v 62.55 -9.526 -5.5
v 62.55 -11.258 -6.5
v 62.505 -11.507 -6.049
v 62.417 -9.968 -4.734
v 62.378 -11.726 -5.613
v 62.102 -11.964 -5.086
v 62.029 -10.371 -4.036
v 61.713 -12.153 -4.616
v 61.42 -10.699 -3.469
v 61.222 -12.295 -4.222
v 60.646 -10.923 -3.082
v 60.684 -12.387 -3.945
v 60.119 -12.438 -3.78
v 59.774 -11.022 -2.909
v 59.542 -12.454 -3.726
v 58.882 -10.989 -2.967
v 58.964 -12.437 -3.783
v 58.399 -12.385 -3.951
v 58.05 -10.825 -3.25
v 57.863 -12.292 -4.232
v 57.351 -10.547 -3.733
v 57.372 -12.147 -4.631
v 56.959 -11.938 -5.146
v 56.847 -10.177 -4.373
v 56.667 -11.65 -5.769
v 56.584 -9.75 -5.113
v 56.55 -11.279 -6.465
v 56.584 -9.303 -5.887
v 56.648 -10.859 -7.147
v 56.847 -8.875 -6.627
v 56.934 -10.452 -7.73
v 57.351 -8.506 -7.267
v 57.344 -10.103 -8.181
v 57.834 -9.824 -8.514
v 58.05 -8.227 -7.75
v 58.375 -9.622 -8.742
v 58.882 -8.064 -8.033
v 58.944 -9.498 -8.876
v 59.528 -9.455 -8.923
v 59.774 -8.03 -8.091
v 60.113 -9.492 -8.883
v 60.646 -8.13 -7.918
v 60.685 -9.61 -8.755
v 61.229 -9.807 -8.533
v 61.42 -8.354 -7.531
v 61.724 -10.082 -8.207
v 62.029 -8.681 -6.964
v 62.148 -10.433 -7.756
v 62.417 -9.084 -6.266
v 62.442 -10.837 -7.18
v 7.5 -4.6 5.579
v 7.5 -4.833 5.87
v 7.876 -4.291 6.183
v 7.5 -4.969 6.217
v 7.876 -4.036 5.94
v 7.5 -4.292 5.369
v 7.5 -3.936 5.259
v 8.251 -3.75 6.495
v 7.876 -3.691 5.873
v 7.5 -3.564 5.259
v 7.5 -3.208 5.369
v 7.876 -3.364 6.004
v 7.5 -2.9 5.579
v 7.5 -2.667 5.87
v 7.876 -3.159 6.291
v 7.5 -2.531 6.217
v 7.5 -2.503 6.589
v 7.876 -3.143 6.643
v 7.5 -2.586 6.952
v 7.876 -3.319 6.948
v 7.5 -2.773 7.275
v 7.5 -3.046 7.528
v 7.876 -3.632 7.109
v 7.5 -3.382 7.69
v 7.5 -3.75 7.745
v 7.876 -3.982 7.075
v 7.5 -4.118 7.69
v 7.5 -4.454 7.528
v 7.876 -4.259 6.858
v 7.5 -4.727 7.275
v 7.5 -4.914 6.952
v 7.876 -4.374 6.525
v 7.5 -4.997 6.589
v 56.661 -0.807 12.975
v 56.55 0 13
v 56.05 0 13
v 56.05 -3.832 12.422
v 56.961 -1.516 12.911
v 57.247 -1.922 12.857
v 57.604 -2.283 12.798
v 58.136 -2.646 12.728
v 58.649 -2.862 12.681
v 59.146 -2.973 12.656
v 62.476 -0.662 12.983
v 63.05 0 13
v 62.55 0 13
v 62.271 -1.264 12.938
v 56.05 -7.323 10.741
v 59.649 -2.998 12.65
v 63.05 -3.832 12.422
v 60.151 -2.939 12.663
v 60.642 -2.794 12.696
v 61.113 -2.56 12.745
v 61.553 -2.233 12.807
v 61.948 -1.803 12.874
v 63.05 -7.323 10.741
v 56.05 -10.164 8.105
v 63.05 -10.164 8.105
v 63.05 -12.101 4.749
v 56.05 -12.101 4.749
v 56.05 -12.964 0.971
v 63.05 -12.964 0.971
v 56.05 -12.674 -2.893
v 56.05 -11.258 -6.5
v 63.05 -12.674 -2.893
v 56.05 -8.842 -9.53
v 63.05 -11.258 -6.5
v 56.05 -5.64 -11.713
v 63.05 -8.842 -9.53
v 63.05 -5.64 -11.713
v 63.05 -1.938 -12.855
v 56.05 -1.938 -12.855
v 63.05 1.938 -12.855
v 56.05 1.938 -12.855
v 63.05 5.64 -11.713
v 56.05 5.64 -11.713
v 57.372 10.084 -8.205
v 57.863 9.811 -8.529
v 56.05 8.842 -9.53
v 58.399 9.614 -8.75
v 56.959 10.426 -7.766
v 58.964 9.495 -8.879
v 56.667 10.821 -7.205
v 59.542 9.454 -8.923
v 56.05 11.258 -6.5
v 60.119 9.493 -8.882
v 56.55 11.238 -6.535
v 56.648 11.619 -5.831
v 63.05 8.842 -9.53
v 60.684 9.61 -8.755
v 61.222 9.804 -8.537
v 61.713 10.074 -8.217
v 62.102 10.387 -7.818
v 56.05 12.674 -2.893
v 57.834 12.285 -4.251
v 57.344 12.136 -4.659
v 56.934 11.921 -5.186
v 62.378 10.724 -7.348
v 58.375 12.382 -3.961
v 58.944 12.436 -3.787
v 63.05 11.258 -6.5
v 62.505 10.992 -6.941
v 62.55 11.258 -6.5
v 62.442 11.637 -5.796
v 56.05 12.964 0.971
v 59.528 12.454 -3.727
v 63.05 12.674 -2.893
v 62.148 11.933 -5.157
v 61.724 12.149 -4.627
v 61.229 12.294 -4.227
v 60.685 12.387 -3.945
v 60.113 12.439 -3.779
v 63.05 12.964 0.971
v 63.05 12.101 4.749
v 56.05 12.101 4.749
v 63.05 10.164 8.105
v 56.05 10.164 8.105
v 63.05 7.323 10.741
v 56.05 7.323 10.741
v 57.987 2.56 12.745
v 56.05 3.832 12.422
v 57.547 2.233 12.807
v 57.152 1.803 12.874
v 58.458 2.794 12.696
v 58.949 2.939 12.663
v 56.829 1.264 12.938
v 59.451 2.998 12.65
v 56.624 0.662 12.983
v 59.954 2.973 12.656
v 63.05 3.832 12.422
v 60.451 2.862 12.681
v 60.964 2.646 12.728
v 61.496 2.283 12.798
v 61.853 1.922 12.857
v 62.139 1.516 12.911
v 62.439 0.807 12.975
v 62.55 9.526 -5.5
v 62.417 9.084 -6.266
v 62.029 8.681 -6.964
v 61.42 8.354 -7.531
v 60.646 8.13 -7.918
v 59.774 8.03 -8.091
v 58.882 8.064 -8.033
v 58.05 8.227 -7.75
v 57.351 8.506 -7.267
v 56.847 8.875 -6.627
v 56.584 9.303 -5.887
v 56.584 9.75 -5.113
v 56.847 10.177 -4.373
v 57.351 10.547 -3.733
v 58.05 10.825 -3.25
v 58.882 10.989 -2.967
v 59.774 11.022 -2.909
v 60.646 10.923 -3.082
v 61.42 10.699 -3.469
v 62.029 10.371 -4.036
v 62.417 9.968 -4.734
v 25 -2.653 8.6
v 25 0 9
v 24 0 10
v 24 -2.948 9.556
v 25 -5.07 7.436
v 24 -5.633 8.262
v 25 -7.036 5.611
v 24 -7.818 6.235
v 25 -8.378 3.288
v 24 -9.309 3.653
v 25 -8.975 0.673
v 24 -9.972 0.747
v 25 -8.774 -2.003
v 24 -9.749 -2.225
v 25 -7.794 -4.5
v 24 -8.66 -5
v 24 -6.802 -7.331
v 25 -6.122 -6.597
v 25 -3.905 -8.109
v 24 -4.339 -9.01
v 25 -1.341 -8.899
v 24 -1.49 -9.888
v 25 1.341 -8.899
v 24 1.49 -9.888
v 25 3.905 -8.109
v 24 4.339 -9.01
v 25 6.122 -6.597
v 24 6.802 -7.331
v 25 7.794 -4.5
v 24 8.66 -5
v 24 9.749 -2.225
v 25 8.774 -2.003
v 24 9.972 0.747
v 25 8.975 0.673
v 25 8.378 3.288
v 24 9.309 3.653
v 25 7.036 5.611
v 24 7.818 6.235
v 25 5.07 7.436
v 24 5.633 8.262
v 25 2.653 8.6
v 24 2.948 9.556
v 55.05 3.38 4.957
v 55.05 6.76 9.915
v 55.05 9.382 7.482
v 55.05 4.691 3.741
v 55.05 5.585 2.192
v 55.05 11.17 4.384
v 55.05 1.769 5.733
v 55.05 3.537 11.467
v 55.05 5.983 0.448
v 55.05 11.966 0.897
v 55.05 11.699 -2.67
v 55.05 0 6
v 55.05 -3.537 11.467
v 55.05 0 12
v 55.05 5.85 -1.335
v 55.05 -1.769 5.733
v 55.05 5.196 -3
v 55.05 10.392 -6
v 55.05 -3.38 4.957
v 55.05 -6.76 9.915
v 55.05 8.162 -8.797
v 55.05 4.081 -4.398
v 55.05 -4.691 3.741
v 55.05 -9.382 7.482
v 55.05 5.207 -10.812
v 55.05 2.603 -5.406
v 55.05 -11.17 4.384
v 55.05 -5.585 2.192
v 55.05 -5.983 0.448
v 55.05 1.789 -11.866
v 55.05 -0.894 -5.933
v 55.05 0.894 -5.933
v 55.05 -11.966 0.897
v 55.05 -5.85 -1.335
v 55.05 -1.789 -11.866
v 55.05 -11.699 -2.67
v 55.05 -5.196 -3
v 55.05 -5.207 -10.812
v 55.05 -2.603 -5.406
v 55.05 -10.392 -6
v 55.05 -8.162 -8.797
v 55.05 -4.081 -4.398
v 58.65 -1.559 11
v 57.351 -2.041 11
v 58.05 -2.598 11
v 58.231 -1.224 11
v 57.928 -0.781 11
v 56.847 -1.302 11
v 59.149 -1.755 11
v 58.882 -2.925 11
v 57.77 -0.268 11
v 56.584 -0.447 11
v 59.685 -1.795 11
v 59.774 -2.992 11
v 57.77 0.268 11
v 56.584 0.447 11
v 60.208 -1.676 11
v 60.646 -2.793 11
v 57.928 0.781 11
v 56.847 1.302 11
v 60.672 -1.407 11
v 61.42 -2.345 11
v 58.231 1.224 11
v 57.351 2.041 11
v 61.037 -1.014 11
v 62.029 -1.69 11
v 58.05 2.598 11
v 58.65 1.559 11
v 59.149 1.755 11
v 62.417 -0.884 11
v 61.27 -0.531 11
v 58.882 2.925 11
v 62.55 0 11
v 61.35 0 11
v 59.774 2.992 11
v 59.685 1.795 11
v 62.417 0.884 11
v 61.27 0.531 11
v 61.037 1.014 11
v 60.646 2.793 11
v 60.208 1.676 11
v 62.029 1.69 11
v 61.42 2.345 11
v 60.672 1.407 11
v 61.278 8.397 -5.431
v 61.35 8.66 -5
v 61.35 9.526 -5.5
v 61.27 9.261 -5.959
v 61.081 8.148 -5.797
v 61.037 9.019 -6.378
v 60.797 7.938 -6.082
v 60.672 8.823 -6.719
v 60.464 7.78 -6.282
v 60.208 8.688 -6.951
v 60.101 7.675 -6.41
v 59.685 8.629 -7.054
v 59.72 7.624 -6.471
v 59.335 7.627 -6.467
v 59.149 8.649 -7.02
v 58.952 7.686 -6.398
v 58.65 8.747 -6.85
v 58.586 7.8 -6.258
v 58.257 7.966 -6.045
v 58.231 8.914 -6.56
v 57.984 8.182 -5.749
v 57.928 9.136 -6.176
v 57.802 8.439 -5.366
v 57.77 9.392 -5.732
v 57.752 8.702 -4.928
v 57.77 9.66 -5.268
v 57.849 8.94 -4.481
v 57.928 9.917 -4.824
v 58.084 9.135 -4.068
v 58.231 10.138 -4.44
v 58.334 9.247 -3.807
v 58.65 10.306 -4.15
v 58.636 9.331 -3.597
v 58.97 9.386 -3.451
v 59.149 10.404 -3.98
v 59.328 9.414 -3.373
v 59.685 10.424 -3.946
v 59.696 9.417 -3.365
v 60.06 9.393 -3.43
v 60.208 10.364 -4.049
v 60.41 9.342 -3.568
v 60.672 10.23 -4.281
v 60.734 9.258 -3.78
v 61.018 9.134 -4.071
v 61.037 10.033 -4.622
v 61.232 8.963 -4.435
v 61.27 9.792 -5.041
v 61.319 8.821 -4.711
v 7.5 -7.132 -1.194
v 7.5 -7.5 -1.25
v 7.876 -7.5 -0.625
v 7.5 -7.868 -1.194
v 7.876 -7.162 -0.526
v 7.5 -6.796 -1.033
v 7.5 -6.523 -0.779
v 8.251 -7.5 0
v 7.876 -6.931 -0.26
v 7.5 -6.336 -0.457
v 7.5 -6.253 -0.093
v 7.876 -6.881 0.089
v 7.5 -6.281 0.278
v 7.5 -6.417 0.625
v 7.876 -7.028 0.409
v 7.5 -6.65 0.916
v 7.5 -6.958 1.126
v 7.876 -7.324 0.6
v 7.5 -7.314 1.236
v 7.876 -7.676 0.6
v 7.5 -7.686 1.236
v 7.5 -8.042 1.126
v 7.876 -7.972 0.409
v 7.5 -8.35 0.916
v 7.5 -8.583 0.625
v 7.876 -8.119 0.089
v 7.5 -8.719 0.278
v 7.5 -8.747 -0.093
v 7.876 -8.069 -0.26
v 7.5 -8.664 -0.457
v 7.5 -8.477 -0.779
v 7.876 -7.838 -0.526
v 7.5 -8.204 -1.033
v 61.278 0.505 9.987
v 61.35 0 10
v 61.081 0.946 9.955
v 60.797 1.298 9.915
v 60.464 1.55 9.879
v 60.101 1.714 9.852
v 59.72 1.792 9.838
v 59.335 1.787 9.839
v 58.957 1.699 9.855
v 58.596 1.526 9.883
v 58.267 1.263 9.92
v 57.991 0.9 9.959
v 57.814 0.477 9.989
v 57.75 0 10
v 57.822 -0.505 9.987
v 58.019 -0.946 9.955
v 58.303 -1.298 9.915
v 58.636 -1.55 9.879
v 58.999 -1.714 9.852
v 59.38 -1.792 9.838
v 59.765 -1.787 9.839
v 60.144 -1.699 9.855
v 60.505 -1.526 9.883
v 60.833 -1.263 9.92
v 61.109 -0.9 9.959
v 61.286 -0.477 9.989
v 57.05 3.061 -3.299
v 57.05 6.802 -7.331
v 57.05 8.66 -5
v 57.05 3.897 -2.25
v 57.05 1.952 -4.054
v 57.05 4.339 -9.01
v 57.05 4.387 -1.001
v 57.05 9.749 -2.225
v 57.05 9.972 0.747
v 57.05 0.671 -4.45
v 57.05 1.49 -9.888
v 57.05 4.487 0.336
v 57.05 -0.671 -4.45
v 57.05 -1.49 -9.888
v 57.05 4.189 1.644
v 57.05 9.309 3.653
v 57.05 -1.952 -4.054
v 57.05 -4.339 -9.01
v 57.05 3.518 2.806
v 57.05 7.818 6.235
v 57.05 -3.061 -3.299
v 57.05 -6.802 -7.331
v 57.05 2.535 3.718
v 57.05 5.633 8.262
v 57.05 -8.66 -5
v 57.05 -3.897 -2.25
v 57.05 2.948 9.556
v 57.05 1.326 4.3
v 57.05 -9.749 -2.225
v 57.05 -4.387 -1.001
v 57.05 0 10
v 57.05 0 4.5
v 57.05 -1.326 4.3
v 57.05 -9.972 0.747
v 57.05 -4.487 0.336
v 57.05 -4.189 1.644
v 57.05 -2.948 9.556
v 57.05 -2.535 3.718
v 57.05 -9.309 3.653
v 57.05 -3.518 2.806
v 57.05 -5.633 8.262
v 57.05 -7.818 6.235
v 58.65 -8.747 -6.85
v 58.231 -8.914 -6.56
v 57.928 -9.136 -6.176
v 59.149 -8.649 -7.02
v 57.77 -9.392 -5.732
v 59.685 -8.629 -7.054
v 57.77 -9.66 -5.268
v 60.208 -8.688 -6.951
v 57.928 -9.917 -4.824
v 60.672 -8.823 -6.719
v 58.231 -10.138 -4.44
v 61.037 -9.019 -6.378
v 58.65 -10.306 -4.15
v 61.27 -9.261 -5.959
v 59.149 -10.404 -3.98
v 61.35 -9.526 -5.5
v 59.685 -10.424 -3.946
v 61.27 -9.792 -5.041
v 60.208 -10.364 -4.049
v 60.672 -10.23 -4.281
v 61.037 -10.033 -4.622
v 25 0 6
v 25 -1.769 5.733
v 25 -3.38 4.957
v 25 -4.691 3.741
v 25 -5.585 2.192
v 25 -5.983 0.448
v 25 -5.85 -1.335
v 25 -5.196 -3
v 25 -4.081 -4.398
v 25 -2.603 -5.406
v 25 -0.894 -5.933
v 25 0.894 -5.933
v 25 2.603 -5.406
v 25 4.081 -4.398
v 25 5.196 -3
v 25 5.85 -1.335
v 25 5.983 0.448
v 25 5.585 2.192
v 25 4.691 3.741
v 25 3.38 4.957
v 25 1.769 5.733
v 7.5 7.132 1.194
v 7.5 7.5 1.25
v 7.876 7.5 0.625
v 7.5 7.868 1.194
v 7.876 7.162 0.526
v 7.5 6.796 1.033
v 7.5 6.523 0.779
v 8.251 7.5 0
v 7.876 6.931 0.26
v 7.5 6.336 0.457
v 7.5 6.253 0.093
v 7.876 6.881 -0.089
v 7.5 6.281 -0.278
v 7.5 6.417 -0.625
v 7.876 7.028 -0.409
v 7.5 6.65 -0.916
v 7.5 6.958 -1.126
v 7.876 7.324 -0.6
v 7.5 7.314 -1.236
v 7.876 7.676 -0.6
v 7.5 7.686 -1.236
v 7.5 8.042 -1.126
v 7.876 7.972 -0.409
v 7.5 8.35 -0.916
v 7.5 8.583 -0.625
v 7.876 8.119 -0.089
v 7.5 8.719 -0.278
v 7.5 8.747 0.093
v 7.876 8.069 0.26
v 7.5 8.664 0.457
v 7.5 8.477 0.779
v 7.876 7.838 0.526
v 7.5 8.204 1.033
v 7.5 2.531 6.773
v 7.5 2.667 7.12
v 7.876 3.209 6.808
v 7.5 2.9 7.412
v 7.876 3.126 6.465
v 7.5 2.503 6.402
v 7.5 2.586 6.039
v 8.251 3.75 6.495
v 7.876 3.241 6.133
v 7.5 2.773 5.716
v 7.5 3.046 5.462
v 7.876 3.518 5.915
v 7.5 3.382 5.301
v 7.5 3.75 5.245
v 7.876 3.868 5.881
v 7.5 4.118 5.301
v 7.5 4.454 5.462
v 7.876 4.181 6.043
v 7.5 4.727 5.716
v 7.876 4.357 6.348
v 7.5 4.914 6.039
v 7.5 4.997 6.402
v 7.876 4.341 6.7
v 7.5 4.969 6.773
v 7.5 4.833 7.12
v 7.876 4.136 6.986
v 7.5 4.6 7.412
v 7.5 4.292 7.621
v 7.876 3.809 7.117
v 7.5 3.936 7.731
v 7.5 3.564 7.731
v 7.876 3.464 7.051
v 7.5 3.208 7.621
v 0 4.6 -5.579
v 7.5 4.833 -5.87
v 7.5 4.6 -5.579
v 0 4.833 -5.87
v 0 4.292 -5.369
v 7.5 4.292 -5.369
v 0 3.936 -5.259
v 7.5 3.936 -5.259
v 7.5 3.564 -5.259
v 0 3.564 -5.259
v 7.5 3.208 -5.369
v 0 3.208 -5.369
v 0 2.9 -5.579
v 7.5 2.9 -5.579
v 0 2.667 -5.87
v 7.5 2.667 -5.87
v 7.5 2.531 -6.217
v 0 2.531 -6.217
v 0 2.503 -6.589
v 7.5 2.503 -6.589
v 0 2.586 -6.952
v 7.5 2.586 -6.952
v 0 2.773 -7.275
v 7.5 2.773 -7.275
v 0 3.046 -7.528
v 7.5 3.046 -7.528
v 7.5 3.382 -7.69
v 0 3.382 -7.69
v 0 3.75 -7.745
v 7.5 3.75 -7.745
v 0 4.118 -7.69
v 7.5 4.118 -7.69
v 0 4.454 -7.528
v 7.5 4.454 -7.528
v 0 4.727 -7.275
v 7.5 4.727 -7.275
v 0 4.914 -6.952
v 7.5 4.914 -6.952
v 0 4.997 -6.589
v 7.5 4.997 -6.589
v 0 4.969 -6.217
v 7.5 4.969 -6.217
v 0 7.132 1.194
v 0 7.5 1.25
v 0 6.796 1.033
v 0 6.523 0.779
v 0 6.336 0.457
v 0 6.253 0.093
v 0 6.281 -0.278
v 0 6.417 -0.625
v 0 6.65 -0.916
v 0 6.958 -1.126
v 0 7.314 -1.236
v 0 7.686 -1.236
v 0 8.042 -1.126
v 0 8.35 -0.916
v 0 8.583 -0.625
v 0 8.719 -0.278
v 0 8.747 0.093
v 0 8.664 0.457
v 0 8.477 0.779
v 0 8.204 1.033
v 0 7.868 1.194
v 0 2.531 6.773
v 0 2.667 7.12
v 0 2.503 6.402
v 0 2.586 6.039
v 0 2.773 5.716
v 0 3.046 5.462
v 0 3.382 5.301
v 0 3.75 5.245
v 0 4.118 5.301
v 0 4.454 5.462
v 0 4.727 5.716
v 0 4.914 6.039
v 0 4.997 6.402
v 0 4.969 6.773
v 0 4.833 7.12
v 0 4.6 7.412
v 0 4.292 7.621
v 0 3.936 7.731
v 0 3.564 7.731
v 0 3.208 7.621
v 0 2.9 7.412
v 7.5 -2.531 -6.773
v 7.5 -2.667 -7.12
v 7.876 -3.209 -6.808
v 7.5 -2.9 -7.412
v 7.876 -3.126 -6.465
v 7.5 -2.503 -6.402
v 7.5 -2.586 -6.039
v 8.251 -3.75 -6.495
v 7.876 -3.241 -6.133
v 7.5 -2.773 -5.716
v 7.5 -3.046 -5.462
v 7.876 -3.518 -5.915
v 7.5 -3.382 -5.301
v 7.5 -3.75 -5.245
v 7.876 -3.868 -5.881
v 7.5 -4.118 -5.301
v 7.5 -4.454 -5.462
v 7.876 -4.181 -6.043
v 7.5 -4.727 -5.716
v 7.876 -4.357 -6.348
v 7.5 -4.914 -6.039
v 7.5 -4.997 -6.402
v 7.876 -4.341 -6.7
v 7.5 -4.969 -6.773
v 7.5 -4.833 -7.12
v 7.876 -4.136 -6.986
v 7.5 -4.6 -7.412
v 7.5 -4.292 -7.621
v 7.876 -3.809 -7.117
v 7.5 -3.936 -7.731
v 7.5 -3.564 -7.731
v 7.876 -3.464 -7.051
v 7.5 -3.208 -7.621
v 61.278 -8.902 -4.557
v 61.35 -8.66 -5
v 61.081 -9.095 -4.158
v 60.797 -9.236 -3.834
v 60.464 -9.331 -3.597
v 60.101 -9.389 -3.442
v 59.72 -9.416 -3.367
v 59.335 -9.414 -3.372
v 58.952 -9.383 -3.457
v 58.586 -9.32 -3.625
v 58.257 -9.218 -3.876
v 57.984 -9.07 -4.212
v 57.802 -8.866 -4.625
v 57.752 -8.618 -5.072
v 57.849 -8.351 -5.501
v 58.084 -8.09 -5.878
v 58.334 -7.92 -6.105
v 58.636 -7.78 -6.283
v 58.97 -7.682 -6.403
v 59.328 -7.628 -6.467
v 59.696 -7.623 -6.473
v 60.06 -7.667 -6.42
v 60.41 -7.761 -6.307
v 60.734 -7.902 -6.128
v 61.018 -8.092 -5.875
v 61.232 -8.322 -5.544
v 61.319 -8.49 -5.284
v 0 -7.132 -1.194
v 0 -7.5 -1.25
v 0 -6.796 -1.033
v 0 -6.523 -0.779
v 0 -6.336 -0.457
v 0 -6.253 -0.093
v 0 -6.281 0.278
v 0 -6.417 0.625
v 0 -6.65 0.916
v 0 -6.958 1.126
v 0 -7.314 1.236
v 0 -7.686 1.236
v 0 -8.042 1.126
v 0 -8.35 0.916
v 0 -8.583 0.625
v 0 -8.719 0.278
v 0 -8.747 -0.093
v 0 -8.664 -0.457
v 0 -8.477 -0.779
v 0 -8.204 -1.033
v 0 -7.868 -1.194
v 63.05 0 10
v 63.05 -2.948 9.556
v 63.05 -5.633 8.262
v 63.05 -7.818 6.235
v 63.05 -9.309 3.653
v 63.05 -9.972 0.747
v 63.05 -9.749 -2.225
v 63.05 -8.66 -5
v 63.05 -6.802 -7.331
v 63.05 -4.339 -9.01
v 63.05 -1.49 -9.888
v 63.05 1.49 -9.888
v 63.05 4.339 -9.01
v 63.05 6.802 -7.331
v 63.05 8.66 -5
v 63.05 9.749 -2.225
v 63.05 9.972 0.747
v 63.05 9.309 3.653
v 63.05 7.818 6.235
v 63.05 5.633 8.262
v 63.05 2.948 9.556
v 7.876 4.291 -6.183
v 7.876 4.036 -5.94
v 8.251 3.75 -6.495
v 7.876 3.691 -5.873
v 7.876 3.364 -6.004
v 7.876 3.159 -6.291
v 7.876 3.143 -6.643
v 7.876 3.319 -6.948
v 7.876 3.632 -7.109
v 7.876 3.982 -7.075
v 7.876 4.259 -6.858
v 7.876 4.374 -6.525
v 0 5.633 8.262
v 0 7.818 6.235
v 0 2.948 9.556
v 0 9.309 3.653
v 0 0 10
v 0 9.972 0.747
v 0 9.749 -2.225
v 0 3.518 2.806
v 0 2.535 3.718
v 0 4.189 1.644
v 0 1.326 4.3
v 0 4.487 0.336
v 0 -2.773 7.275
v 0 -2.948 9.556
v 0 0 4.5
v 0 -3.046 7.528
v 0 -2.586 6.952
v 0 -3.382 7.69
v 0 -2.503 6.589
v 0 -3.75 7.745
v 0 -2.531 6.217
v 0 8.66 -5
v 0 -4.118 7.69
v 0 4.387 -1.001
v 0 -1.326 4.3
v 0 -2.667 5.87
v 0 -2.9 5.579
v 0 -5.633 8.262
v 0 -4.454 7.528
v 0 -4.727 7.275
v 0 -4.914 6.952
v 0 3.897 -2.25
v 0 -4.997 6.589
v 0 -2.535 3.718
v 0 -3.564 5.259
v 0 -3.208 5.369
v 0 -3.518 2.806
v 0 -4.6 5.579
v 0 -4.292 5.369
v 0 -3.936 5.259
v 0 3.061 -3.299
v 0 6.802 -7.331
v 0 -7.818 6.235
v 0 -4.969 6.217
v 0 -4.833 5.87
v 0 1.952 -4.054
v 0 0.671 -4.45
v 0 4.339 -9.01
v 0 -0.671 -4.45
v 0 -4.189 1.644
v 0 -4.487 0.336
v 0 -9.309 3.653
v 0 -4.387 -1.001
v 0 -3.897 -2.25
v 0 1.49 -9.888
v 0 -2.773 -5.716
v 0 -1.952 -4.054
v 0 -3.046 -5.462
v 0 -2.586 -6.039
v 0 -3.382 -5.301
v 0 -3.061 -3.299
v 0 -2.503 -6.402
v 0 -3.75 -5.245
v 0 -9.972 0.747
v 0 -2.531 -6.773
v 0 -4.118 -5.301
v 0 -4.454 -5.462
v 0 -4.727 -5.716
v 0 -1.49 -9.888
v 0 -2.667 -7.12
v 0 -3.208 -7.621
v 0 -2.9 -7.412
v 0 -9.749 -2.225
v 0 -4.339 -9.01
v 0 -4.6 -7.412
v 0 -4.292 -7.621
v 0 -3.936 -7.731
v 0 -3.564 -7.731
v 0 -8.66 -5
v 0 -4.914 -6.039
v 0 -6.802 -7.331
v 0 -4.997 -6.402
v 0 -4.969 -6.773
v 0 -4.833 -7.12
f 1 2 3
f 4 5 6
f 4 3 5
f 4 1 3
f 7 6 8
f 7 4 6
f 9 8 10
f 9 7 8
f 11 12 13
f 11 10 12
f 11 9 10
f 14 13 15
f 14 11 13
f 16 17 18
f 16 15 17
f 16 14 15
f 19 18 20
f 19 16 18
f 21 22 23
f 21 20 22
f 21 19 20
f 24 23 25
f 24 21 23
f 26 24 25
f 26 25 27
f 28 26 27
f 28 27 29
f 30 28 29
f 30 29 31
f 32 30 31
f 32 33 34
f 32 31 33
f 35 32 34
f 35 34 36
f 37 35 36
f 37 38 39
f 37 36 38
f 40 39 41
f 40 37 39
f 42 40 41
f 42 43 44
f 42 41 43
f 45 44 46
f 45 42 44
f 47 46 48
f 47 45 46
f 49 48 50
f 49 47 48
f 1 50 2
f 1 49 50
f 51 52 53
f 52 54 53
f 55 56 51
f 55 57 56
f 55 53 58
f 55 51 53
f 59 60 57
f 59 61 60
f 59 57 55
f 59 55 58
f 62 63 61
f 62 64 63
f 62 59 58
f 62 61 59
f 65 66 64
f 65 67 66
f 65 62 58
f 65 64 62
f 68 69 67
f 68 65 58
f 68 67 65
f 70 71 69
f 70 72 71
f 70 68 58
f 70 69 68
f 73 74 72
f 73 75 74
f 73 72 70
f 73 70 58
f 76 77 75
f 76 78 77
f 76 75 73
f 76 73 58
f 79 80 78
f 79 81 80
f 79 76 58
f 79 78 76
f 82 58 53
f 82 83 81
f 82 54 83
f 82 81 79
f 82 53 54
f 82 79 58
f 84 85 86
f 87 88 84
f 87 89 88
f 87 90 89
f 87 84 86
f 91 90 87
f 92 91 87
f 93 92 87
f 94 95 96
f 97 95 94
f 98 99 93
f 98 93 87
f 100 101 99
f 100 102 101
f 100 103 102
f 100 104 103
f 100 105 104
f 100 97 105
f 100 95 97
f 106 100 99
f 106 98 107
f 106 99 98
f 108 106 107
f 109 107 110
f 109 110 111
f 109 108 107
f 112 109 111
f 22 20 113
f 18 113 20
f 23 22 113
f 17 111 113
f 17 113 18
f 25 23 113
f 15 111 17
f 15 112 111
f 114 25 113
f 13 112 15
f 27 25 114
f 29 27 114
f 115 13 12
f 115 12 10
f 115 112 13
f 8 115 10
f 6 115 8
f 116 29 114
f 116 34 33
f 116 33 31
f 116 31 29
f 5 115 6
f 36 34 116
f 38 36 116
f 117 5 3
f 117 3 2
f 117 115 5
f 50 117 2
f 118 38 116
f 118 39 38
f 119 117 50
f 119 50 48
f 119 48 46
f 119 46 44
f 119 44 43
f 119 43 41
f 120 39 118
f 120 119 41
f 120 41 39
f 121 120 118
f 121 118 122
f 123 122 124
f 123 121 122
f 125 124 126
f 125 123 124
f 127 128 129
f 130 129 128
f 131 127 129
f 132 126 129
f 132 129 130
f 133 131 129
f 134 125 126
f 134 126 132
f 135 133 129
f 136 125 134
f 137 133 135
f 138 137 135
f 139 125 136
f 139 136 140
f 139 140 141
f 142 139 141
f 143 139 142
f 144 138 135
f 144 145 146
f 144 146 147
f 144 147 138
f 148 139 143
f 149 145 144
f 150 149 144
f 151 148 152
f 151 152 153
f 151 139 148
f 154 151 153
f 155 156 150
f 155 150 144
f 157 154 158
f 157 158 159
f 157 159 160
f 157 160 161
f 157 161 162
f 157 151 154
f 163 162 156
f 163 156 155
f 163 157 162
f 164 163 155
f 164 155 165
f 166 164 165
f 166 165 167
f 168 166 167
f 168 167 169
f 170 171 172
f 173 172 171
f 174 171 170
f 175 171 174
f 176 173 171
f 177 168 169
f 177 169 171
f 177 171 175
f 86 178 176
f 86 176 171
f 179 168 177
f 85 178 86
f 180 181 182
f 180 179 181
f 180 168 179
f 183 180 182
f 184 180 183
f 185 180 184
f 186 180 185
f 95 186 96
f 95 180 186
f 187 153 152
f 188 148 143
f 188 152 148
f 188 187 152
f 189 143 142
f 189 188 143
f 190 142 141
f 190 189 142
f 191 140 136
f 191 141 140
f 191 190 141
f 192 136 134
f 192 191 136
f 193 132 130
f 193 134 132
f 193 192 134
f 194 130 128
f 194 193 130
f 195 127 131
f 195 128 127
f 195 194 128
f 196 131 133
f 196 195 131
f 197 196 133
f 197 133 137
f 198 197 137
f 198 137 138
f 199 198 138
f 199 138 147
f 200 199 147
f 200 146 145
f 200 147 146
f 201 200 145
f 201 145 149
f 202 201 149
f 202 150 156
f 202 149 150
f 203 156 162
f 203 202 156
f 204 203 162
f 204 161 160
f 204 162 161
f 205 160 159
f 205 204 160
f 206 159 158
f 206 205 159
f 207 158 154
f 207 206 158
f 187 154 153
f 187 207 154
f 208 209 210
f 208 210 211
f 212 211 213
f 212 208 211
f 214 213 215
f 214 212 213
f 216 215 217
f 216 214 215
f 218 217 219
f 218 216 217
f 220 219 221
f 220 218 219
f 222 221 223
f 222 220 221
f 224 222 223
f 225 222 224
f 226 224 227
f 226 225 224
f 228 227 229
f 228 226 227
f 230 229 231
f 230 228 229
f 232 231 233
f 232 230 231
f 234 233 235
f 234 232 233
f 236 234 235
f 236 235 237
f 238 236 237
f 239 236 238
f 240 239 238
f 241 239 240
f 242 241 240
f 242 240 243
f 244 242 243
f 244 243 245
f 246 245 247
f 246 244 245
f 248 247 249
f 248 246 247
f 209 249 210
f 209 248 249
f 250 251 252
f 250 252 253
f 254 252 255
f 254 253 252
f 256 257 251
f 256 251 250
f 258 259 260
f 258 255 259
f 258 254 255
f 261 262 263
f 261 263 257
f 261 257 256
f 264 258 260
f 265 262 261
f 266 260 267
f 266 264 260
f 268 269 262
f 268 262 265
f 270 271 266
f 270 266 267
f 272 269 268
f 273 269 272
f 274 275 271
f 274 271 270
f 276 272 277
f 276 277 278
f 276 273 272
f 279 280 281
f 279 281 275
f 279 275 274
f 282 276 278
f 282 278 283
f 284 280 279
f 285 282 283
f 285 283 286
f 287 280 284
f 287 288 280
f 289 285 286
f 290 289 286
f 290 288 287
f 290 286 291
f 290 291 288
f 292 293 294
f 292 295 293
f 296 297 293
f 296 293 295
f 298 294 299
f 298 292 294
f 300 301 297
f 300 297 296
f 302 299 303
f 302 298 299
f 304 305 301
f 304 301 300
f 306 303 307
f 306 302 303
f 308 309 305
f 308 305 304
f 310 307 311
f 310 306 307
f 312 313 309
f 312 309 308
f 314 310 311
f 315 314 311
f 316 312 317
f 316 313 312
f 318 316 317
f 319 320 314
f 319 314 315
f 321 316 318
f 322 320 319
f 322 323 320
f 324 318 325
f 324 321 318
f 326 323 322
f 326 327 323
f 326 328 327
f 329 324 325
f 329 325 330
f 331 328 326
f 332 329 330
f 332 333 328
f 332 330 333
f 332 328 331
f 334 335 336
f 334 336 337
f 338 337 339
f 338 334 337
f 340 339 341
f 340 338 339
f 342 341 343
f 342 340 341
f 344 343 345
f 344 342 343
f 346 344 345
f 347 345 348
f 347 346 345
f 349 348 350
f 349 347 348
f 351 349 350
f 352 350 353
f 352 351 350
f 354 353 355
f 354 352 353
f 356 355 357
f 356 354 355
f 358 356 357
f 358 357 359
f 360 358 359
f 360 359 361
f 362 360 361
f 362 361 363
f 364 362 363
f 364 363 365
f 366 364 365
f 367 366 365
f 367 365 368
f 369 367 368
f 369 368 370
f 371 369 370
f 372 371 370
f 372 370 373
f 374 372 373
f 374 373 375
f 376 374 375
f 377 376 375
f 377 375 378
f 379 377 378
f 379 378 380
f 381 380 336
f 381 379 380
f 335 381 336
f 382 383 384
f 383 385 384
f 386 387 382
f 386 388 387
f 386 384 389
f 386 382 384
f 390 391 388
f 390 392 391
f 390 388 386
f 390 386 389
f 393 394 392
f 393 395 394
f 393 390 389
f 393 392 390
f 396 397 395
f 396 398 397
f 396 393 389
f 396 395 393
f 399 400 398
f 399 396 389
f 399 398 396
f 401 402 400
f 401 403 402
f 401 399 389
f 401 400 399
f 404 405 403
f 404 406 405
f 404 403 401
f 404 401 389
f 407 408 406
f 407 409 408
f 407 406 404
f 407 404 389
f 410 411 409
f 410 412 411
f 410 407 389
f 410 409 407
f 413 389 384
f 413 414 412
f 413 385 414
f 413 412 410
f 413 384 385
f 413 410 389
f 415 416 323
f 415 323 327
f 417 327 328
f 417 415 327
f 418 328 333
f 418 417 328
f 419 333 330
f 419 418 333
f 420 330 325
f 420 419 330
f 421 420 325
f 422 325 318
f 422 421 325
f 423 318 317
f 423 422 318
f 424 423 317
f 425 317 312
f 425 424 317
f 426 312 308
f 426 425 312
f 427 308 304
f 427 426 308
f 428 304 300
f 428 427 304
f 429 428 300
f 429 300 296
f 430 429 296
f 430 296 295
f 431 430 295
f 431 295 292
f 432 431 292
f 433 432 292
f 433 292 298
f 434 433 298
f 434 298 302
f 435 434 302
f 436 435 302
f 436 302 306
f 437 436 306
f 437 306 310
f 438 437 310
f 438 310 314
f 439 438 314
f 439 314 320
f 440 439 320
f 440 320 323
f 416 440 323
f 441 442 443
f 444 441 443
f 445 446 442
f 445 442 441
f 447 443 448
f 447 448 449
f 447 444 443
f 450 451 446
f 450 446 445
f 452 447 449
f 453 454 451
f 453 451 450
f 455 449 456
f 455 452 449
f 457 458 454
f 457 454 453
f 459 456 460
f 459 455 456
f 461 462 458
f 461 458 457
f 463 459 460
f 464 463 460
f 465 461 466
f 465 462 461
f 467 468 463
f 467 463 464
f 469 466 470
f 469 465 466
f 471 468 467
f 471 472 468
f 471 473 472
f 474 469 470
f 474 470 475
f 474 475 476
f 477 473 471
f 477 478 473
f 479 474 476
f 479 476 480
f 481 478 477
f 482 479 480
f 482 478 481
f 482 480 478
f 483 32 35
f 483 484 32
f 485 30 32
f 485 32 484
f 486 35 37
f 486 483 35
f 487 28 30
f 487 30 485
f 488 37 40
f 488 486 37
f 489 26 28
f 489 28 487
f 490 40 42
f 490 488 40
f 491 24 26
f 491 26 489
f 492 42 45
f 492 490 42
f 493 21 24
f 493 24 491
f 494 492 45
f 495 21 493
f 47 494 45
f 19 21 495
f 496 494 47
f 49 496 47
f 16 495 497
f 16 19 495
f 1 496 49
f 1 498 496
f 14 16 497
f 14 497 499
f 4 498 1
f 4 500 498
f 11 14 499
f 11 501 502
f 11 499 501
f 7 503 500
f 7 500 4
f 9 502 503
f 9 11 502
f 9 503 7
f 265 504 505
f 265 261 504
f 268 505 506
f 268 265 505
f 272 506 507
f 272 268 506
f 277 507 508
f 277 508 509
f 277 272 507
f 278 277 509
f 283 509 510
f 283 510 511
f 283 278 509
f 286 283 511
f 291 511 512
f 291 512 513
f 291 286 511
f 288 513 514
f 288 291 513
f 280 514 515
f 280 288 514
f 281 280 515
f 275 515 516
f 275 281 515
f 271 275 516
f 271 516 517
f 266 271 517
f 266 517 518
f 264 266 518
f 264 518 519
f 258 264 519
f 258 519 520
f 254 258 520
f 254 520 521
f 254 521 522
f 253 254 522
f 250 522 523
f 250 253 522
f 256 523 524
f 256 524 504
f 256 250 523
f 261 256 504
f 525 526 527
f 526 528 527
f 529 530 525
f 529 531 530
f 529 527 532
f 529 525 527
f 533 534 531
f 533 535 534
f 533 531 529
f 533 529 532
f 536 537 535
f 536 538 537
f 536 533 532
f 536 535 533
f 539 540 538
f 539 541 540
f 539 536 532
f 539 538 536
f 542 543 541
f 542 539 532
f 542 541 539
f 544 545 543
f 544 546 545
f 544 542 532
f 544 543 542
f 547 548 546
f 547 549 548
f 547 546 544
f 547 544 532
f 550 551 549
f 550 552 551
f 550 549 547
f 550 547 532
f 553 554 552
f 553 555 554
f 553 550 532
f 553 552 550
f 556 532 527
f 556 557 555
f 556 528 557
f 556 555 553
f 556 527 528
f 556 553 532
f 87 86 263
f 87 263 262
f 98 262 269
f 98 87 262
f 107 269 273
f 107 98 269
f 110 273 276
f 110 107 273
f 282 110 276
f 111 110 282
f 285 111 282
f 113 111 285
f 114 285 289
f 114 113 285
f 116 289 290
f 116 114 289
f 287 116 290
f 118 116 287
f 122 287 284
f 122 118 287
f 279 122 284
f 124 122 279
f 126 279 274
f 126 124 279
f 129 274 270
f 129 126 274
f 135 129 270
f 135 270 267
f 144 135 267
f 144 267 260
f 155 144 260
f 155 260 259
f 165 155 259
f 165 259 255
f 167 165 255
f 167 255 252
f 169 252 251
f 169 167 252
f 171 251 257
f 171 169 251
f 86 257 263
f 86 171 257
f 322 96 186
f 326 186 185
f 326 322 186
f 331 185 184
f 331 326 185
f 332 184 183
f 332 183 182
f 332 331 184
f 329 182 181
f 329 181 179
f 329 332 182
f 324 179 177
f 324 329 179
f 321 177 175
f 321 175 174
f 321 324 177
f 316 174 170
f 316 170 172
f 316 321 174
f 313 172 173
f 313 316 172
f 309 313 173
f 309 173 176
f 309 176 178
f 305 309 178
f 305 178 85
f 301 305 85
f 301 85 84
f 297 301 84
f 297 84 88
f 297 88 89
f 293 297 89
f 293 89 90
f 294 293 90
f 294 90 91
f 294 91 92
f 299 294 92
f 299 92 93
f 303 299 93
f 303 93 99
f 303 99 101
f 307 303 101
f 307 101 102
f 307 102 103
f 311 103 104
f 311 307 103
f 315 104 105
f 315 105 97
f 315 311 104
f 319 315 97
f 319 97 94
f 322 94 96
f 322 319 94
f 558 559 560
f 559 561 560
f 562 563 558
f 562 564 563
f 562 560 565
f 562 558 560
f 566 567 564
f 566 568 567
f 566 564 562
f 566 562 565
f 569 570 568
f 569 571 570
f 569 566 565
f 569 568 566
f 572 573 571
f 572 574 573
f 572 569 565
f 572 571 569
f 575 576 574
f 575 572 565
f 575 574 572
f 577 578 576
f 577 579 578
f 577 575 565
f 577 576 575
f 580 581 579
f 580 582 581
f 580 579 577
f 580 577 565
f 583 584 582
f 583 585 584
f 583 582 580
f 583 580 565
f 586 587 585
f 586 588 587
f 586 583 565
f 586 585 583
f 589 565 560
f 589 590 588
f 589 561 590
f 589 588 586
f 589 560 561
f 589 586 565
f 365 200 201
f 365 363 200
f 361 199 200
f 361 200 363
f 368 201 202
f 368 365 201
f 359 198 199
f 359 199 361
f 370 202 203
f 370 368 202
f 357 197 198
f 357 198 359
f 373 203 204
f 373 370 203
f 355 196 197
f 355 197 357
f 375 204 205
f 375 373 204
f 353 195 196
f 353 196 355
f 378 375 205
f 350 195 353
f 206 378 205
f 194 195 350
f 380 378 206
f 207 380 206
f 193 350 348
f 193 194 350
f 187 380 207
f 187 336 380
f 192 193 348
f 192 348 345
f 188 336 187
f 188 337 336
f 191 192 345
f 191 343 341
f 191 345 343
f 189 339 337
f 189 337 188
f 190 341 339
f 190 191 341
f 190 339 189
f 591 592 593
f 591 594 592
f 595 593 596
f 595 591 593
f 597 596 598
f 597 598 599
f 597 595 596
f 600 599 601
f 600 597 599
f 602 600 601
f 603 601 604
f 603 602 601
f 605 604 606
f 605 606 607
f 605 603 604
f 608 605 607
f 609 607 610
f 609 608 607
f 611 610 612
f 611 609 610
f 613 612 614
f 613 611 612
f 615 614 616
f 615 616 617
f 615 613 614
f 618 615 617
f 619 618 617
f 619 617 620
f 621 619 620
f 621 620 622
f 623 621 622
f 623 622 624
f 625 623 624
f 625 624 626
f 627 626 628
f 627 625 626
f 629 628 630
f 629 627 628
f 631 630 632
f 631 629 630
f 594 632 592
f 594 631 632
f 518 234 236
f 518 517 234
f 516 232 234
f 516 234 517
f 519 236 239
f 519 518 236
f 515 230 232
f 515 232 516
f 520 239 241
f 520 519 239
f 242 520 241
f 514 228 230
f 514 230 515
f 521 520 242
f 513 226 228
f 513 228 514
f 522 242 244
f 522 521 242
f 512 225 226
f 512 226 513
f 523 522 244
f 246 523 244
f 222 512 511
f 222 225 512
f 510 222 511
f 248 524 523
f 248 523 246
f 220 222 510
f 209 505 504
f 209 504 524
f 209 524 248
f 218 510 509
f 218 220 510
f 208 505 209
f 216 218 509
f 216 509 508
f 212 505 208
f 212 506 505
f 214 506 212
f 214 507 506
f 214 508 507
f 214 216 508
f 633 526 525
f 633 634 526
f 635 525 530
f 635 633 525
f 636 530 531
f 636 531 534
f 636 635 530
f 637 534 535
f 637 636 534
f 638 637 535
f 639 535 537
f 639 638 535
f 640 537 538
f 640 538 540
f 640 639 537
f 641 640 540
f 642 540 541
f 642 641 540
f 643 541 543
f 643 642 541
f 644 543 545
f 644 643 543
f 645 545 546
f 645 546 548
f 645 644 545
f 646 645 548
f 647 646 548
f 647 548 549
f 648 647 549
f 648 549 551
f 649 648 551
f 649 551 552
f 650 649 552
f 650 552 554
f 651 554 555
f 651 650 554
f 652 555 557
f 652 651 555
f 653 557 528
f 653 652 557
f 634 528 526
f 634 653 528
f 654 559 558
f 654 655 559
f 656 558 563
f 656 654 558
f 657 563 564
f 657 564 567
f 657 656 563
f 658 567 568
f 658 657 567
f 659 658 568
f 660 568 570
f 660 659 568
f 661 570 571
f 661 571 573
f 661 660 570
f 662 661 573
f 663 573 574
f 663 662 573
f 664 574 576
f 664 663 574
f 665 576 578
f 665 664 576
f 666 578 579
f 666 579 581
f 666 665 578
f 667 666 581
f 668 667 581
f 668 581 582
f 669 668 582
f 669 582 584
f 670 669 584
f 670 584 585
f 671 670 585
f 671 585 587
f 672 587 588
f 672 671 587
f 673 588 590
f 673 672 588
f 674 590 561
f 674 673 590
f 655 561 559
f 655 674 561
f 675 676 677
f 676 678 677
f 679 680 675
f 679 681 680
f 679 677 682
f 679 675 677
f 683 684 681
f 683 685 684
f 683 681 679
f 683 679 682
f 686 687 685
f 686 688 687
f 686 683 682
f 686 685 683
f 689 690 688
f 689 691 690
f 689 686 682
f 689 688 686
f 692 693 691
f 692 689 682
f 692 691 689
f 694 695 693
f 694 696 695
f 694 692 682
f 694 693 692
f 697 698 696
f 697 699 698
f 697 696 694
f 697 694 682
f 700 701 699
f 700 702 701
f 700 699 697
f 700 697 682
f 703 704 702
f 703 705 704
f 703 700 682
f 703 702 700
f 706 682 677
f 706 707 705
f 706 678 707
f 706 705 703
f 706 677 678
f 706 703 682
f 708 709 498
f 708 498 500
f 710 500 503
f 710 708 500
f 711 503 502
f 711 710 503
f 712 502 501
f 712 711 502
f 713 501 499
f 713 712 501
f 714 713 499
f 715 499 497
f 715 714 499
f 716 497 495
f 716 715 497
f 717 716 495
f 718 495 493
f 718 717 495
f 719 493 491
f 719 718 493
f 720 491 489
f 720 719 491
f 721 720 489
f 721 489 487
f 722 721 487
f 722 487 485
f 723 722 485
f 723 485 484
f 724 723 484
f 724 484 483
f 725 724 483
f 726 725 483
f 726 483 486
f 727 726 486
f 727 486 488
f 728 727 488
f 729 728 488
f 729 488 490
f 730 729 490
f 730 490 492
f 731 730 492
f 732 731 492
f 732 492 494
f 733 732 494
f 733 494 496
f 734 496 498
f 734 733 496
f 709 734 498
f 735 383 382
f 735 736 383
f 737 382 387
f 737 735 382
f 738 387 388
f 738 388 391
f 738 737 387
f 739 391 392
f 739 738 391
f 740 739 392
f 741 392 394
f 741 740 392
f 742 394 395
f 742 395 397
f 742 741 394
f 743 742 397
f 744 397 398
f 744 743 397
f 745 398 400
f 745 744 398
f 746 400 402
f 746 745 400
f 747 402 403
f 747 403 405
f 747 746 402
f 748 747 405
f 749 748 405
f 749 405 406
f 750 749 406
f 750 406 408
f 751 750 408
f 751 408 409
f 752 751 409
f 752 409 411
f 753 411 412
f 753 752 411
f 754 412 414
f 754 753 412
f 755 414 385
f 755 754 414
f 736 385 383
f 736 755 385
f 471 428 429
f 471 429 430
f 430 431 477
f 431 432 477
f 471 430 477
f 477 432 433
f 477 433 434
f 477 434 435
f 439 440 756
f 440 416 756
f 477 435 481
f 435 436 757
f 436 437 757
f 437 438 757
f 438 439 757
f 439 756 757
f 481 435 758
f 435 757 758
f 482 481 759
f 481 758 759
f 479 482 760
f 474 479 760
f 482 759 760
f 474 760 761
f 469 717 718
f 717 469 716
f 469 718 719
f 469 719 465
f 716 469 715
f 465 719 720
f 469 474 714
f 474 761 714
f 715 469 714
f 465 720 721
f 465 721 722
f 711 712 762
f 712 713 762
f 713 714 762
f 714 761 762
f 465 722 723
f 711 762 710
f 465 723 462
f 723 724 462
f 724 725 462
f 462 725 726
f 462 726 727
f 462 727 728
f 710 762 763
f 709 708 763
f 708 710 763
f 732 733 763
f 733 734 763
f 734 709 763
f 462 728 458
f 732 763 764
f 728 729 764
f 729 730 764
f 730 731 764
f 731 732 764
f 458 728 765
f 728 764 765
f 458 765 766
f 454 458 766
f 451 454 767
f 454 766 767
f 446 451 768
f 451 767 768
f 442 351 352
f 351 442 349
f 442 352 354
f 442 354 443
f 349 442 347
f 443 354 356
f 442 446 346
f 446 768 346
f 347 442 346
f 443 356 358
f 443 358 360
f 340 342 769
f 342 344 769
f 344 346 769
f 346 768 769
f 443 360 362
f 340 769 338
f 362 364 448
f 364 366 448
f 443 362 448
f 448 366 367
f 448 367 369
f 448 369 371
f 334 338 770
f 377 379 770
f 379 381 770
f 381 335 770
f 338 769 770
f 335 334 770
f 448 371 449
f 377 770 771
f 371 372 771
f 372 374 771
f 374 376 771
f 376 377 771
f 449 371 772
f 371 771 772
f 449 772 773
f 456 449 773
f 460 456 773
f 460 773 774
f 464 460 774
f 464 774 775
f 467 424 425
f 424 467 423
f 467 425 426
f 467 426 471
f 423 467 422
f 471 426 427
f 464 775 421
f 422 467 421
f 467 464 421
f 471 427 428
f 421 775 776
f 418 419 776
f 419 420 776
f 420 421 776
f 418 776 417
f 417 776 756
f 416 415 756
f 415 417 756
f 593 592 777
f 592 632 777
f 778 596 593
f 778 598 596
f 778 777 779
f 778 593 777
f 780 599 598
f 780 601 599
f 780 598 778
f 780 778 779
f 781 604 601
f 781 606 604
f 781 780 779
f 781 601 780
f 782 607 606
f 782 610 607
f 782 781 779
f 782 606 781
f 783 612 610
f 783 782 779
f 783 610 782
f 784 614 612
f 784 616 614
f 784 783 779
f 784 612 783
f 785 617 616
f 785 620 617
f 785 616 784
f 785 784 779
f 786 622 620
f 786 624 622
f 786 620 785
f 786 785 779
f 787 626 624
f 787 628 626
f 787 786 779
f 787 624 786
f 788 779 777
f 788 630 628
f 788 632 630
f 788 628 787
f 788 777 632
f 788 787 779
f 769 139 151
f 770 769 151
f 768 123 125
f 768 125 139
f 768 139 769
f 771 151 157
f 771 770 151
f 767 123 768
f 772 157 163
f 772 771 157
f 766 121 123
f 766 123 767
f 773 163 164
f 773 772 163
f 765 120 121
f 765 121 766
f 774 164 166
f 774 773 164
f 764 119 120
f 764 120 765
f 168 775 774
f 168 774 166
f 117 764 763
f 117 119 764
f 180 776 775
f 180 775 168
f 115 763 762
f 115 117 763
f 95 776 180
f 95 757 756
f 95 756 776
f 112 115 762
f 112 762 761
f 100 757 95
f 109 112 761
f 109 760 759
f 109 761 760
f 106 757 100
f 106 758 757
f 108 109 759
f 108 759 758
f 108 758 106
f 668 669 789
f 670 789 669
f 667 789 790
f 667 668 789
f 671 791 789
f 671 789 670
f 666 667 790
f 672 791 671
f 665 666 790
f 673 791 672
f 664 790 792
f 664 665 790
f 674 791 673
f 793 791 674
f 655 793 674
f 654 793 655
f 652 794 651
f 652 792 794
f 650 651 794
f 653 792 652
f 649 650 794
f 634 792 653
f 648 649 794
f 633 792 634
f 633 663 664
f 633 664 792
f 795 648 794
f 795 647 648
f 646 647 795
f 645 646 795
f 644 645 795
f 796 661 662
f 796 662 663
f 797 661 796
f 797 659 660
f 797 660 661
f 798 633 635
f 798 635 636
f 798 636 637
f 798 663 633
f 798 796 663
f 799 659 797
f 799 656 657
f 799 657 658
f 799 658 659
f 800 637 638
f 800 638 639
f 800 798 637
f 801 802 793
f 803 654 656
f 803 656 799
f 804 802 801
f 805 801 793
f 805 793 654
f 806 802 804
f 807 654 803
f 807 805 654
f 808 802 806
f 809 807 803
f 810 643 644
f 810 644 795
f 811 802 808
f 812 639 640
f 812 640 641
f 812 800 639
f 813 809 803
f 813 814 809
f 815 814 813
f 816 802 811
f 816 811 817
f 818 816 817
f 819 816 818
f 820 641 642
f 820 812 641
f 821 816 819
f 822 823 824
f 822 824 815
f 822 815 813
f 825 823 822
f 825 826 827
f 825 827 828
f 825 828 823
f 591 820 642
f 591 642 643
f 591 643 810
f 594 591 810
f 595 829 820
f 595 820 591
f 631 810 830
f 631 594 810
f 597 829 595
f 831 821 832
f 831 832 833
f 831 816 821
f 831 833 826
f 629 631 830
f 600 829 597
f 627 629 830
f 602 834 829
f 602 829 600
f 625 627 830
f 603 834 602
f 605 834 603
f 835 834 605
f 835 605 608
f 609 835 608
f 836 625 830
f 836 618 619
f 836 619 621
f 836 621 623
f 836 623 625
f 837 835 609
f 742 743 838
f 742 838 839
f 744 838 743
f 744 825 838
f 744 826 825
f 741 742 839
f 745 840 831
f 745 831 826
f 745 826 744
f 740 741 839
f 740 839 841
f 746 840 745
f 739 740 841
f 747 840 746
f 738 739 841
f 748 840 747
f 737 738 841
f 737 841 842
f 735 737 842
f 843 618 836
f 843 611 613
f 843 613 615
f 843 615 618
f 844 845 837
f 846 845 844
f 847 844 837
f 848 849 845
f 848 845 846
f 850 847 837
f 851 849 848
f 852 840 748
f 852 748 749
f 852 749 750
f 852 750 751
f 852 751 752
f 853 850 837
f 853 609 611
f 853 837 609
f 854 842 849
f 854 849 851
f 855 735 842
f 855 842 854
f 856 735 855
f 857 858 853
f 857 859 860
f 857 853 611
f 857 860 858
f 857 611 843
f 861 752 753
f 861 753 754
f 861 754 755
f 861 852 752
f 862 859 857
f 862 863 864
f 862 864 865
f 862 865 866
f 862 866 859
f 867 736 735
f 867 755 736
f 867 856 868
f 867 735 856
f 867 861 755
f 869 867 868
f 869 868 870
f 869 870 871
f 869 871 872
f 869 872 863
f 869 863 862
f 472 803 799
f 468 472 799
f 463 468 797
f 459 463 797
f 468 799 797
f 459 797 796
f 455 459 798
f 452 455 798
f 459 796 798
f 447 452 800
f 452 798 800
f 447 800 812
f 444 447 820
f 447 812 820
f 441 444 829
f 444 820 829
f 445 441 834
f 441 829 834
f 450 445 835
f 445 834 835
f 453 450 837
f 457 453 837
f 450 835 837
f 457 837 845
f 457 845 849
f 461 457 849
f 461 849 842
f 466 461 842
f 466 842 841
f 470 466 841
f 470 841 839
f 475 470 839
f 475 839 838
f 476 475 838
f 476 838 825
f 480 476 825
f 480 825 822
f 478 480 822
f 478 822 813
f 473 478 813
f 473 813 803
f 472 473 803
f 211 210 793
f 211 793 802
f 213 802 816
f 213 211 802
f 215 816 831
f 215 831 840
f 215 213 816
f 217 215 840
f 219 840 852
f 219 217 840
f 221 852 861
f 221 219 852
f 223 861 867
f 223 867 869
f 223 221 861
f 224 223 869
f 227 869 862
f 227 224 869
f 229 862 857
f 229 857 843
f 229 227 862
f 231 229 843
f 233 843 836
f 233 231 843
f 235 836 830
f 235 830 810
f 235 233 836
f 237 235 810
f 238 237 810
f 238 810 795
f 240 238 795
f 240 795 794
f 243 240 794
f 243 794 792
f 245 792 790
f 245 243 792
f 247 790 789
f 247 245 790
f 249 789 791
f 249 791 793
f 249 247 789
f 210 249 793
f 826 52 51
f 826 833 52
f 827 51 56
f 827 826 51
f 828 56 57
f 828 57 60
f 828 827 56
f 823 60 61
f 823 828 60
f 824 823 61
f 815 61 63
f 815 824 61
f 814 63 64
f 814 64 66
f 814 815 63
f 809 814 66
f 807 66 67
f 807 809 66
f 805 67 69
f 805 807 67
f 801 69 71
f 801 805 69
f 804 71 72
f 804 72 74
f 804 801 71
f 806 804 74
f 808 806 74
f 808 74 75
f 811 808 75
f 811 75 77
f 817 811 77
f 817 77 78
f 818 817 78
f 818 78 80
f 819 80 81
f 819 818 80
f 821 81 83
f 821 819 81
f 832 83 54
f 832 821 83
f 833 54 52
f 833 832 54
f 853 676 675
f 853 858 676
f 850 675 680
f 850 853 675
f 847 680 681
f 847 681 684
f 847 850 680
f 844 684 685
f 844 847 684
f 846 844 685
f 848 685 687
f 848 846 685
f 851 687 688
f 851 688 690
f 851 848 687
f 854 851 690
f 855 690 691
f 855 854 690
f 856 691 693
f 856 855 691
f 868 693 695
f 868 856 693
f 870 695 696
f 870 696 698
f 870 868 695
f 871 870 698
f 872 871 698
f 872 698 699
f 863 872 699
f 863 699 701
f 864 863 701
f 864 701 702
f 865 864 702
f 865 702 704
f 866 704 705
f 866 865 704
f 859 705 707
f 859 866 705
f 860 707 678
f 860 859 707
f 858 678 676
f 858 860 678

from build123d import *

# Parameters (mm, degrees)
SKETCH_2_R                = 10
CUT_EXTRUDE_1_DEPTH       = 6
SKETCH_3_R                = 4.5
CUT_EXTRUDE_2_DEPTH       = 66.675737529
HOLE_START                = 11
HOLE_WIZARD_1_OUTLINE_R   = 3
HOLE_WIZARD_1_DEPTH       = 2.000000102
HOLE_START_2              = 9.836666254
HOLE_WIZARD_1_2_OUTLINE_R = 1.8
HOLE_WIZARD_1_2_DEPTH     = 1.163333746
PATTERN_CIRCULAR_1_COUNT  = 3
PATTERN_CIRCULAR_2_COUNT  = 6
CHAMFER_1_SIZE            = 1


# Read off the part's stored shape, not the designer's step: 打孔尺寸(%根据)内六角圆柱头螺钉的类型1
with BuildPart() as part:
    # 草图1 → 旋转1 (revolve)
    with BuildSketch(Plane.XY, mode=Mode.PRIVATE) as revolve_1_sk:
        Polygon((0, 0), (0, 10), (25, 10), (25, 6), (55.05, 6), (55.05, 13), (63.05, 13), (63.05, 0), align=None)
    revolve(revolve_1_sk.sketch.rotate(Axis((-26.16483903, 0, 0), (1, 0, 0)), 90), axis=Axis((-26.16483903, 0, 0), (1, 0, 0)))

    # 草图2 → 切除-拉伸1 (cut)
    with BuildSketch(Plane(origin=(63.05, 0, 0), x_dir=(0, 0, -1), z_dir=(1, 0, 0))):
        with Locations(Location((0, 0, 0), (0, 0, 180))):
            Circle(SKETCH_2_R)
    extrude(amount=-CUT_EXTRUDE_1_DEPTH, mode=Mode.SUBTRACT)

    # 草图3 → 切除-拉伸2 (cut, through all)
    with BuildSketch(Plane.ZY):
        Circle(SKETCH_3_R)
    extrude(amount=-CUT_EXTRUDE_2_DEPTH, mode=Mode.SUBTRACT)

    # 打孔尺寸(%根据)内六角圆柱头螺钉的类型1 outline → 打孔尺寸(%根据)内六角圆柱头螺钉的类型1 (cut)
    with BuildSketch(Plane.XY.offset(HOLE_START)):
        with Locations((59.55, 0)):
            Circle(HOLE_WIZARD_1_OUTLINE_R)
    hole_wizard_1 = extrude(amount=HOLE_WIZARD_1_DEPTH, mode=Mode.SUBTRACT)

    # Hole Wizard 1 2 outline → Hole Wizard 1 2 (cut)
    with BuildSketch(Plane.XY.offset(HOLE_START_2)):
        with Locations((59.55, 0)):
            Circle(HOLE_WIZARD_1_2_OUTLINE_R)
    hole_wizard_1_2 = extrude(amount=HOLE_WIZARD_1_2_DEPTH, mode=Mode.SUBTRACT)

    # 阵列(圆周)1: 打孔尺寸(%根据)内六角圆柱头螺钉的类型1, Hole Wizard 1 2 ×3 about axis
    pattern_circular_1_axis = Axis((0, 0, 0), (1, 0, 0))
    add([hole_wizard_1.rotate(pattern_circular_1_axis, i * 360 / PATTERN_CIRCULAR_1_COUNT) for i in range(1, PATTERN_CIRCULAR_1_COUNT)], mode=Mode.SUBTRACT)
    add([hole_wizard_1_2.rotate(pattern_circular_1_axis, i * 360 / PATTERN_CIRCULAR_1_COUNT) for i in range(1, PATTERN_CIRCULAR_1_COUNT)], mode=Mode.SUBTRACT)

    # 草图10 → M3 螺纹孔1 (revolve, cut)
    with BuildSketch(Plane.ZX.offset(7.5)):
        Polygon((0, 0), (0, 8.251075774), (1.25, 7.5), (1.25, 0), align=None)
    hole_wizard_m3_1 = revolve(axis=Axis((-6.35, 7.5, 0), (1, 0, 0)), mode=Mode.SUBTRACT)

    # 阵列(圆周)2: M3 螺纹孔1 ×6 about axis
    pattern_circular_2_axis = Axis((0, 0, 0), (1, 0, 0))
    for i in range(1, PATTERN_CIRCULAR_2_COUNT):
        add(hole_wizard_m3_1.rotate(pattern_circular_2_axis, i * 360 / PATTERN_CIRCULAR_2_COUNT), mode=Mode.SUBTRACT)

    # 倒角1
    chamfer_1_edges = [part.edges().sort_by_distance(p)[0] for p in [
        (55.05, 0, -13),
        (25, 0, -10),
    ]]
    chamfer(chamfer_1_edges, length=CHAMFER_1_SIZE)


solid = part.part
